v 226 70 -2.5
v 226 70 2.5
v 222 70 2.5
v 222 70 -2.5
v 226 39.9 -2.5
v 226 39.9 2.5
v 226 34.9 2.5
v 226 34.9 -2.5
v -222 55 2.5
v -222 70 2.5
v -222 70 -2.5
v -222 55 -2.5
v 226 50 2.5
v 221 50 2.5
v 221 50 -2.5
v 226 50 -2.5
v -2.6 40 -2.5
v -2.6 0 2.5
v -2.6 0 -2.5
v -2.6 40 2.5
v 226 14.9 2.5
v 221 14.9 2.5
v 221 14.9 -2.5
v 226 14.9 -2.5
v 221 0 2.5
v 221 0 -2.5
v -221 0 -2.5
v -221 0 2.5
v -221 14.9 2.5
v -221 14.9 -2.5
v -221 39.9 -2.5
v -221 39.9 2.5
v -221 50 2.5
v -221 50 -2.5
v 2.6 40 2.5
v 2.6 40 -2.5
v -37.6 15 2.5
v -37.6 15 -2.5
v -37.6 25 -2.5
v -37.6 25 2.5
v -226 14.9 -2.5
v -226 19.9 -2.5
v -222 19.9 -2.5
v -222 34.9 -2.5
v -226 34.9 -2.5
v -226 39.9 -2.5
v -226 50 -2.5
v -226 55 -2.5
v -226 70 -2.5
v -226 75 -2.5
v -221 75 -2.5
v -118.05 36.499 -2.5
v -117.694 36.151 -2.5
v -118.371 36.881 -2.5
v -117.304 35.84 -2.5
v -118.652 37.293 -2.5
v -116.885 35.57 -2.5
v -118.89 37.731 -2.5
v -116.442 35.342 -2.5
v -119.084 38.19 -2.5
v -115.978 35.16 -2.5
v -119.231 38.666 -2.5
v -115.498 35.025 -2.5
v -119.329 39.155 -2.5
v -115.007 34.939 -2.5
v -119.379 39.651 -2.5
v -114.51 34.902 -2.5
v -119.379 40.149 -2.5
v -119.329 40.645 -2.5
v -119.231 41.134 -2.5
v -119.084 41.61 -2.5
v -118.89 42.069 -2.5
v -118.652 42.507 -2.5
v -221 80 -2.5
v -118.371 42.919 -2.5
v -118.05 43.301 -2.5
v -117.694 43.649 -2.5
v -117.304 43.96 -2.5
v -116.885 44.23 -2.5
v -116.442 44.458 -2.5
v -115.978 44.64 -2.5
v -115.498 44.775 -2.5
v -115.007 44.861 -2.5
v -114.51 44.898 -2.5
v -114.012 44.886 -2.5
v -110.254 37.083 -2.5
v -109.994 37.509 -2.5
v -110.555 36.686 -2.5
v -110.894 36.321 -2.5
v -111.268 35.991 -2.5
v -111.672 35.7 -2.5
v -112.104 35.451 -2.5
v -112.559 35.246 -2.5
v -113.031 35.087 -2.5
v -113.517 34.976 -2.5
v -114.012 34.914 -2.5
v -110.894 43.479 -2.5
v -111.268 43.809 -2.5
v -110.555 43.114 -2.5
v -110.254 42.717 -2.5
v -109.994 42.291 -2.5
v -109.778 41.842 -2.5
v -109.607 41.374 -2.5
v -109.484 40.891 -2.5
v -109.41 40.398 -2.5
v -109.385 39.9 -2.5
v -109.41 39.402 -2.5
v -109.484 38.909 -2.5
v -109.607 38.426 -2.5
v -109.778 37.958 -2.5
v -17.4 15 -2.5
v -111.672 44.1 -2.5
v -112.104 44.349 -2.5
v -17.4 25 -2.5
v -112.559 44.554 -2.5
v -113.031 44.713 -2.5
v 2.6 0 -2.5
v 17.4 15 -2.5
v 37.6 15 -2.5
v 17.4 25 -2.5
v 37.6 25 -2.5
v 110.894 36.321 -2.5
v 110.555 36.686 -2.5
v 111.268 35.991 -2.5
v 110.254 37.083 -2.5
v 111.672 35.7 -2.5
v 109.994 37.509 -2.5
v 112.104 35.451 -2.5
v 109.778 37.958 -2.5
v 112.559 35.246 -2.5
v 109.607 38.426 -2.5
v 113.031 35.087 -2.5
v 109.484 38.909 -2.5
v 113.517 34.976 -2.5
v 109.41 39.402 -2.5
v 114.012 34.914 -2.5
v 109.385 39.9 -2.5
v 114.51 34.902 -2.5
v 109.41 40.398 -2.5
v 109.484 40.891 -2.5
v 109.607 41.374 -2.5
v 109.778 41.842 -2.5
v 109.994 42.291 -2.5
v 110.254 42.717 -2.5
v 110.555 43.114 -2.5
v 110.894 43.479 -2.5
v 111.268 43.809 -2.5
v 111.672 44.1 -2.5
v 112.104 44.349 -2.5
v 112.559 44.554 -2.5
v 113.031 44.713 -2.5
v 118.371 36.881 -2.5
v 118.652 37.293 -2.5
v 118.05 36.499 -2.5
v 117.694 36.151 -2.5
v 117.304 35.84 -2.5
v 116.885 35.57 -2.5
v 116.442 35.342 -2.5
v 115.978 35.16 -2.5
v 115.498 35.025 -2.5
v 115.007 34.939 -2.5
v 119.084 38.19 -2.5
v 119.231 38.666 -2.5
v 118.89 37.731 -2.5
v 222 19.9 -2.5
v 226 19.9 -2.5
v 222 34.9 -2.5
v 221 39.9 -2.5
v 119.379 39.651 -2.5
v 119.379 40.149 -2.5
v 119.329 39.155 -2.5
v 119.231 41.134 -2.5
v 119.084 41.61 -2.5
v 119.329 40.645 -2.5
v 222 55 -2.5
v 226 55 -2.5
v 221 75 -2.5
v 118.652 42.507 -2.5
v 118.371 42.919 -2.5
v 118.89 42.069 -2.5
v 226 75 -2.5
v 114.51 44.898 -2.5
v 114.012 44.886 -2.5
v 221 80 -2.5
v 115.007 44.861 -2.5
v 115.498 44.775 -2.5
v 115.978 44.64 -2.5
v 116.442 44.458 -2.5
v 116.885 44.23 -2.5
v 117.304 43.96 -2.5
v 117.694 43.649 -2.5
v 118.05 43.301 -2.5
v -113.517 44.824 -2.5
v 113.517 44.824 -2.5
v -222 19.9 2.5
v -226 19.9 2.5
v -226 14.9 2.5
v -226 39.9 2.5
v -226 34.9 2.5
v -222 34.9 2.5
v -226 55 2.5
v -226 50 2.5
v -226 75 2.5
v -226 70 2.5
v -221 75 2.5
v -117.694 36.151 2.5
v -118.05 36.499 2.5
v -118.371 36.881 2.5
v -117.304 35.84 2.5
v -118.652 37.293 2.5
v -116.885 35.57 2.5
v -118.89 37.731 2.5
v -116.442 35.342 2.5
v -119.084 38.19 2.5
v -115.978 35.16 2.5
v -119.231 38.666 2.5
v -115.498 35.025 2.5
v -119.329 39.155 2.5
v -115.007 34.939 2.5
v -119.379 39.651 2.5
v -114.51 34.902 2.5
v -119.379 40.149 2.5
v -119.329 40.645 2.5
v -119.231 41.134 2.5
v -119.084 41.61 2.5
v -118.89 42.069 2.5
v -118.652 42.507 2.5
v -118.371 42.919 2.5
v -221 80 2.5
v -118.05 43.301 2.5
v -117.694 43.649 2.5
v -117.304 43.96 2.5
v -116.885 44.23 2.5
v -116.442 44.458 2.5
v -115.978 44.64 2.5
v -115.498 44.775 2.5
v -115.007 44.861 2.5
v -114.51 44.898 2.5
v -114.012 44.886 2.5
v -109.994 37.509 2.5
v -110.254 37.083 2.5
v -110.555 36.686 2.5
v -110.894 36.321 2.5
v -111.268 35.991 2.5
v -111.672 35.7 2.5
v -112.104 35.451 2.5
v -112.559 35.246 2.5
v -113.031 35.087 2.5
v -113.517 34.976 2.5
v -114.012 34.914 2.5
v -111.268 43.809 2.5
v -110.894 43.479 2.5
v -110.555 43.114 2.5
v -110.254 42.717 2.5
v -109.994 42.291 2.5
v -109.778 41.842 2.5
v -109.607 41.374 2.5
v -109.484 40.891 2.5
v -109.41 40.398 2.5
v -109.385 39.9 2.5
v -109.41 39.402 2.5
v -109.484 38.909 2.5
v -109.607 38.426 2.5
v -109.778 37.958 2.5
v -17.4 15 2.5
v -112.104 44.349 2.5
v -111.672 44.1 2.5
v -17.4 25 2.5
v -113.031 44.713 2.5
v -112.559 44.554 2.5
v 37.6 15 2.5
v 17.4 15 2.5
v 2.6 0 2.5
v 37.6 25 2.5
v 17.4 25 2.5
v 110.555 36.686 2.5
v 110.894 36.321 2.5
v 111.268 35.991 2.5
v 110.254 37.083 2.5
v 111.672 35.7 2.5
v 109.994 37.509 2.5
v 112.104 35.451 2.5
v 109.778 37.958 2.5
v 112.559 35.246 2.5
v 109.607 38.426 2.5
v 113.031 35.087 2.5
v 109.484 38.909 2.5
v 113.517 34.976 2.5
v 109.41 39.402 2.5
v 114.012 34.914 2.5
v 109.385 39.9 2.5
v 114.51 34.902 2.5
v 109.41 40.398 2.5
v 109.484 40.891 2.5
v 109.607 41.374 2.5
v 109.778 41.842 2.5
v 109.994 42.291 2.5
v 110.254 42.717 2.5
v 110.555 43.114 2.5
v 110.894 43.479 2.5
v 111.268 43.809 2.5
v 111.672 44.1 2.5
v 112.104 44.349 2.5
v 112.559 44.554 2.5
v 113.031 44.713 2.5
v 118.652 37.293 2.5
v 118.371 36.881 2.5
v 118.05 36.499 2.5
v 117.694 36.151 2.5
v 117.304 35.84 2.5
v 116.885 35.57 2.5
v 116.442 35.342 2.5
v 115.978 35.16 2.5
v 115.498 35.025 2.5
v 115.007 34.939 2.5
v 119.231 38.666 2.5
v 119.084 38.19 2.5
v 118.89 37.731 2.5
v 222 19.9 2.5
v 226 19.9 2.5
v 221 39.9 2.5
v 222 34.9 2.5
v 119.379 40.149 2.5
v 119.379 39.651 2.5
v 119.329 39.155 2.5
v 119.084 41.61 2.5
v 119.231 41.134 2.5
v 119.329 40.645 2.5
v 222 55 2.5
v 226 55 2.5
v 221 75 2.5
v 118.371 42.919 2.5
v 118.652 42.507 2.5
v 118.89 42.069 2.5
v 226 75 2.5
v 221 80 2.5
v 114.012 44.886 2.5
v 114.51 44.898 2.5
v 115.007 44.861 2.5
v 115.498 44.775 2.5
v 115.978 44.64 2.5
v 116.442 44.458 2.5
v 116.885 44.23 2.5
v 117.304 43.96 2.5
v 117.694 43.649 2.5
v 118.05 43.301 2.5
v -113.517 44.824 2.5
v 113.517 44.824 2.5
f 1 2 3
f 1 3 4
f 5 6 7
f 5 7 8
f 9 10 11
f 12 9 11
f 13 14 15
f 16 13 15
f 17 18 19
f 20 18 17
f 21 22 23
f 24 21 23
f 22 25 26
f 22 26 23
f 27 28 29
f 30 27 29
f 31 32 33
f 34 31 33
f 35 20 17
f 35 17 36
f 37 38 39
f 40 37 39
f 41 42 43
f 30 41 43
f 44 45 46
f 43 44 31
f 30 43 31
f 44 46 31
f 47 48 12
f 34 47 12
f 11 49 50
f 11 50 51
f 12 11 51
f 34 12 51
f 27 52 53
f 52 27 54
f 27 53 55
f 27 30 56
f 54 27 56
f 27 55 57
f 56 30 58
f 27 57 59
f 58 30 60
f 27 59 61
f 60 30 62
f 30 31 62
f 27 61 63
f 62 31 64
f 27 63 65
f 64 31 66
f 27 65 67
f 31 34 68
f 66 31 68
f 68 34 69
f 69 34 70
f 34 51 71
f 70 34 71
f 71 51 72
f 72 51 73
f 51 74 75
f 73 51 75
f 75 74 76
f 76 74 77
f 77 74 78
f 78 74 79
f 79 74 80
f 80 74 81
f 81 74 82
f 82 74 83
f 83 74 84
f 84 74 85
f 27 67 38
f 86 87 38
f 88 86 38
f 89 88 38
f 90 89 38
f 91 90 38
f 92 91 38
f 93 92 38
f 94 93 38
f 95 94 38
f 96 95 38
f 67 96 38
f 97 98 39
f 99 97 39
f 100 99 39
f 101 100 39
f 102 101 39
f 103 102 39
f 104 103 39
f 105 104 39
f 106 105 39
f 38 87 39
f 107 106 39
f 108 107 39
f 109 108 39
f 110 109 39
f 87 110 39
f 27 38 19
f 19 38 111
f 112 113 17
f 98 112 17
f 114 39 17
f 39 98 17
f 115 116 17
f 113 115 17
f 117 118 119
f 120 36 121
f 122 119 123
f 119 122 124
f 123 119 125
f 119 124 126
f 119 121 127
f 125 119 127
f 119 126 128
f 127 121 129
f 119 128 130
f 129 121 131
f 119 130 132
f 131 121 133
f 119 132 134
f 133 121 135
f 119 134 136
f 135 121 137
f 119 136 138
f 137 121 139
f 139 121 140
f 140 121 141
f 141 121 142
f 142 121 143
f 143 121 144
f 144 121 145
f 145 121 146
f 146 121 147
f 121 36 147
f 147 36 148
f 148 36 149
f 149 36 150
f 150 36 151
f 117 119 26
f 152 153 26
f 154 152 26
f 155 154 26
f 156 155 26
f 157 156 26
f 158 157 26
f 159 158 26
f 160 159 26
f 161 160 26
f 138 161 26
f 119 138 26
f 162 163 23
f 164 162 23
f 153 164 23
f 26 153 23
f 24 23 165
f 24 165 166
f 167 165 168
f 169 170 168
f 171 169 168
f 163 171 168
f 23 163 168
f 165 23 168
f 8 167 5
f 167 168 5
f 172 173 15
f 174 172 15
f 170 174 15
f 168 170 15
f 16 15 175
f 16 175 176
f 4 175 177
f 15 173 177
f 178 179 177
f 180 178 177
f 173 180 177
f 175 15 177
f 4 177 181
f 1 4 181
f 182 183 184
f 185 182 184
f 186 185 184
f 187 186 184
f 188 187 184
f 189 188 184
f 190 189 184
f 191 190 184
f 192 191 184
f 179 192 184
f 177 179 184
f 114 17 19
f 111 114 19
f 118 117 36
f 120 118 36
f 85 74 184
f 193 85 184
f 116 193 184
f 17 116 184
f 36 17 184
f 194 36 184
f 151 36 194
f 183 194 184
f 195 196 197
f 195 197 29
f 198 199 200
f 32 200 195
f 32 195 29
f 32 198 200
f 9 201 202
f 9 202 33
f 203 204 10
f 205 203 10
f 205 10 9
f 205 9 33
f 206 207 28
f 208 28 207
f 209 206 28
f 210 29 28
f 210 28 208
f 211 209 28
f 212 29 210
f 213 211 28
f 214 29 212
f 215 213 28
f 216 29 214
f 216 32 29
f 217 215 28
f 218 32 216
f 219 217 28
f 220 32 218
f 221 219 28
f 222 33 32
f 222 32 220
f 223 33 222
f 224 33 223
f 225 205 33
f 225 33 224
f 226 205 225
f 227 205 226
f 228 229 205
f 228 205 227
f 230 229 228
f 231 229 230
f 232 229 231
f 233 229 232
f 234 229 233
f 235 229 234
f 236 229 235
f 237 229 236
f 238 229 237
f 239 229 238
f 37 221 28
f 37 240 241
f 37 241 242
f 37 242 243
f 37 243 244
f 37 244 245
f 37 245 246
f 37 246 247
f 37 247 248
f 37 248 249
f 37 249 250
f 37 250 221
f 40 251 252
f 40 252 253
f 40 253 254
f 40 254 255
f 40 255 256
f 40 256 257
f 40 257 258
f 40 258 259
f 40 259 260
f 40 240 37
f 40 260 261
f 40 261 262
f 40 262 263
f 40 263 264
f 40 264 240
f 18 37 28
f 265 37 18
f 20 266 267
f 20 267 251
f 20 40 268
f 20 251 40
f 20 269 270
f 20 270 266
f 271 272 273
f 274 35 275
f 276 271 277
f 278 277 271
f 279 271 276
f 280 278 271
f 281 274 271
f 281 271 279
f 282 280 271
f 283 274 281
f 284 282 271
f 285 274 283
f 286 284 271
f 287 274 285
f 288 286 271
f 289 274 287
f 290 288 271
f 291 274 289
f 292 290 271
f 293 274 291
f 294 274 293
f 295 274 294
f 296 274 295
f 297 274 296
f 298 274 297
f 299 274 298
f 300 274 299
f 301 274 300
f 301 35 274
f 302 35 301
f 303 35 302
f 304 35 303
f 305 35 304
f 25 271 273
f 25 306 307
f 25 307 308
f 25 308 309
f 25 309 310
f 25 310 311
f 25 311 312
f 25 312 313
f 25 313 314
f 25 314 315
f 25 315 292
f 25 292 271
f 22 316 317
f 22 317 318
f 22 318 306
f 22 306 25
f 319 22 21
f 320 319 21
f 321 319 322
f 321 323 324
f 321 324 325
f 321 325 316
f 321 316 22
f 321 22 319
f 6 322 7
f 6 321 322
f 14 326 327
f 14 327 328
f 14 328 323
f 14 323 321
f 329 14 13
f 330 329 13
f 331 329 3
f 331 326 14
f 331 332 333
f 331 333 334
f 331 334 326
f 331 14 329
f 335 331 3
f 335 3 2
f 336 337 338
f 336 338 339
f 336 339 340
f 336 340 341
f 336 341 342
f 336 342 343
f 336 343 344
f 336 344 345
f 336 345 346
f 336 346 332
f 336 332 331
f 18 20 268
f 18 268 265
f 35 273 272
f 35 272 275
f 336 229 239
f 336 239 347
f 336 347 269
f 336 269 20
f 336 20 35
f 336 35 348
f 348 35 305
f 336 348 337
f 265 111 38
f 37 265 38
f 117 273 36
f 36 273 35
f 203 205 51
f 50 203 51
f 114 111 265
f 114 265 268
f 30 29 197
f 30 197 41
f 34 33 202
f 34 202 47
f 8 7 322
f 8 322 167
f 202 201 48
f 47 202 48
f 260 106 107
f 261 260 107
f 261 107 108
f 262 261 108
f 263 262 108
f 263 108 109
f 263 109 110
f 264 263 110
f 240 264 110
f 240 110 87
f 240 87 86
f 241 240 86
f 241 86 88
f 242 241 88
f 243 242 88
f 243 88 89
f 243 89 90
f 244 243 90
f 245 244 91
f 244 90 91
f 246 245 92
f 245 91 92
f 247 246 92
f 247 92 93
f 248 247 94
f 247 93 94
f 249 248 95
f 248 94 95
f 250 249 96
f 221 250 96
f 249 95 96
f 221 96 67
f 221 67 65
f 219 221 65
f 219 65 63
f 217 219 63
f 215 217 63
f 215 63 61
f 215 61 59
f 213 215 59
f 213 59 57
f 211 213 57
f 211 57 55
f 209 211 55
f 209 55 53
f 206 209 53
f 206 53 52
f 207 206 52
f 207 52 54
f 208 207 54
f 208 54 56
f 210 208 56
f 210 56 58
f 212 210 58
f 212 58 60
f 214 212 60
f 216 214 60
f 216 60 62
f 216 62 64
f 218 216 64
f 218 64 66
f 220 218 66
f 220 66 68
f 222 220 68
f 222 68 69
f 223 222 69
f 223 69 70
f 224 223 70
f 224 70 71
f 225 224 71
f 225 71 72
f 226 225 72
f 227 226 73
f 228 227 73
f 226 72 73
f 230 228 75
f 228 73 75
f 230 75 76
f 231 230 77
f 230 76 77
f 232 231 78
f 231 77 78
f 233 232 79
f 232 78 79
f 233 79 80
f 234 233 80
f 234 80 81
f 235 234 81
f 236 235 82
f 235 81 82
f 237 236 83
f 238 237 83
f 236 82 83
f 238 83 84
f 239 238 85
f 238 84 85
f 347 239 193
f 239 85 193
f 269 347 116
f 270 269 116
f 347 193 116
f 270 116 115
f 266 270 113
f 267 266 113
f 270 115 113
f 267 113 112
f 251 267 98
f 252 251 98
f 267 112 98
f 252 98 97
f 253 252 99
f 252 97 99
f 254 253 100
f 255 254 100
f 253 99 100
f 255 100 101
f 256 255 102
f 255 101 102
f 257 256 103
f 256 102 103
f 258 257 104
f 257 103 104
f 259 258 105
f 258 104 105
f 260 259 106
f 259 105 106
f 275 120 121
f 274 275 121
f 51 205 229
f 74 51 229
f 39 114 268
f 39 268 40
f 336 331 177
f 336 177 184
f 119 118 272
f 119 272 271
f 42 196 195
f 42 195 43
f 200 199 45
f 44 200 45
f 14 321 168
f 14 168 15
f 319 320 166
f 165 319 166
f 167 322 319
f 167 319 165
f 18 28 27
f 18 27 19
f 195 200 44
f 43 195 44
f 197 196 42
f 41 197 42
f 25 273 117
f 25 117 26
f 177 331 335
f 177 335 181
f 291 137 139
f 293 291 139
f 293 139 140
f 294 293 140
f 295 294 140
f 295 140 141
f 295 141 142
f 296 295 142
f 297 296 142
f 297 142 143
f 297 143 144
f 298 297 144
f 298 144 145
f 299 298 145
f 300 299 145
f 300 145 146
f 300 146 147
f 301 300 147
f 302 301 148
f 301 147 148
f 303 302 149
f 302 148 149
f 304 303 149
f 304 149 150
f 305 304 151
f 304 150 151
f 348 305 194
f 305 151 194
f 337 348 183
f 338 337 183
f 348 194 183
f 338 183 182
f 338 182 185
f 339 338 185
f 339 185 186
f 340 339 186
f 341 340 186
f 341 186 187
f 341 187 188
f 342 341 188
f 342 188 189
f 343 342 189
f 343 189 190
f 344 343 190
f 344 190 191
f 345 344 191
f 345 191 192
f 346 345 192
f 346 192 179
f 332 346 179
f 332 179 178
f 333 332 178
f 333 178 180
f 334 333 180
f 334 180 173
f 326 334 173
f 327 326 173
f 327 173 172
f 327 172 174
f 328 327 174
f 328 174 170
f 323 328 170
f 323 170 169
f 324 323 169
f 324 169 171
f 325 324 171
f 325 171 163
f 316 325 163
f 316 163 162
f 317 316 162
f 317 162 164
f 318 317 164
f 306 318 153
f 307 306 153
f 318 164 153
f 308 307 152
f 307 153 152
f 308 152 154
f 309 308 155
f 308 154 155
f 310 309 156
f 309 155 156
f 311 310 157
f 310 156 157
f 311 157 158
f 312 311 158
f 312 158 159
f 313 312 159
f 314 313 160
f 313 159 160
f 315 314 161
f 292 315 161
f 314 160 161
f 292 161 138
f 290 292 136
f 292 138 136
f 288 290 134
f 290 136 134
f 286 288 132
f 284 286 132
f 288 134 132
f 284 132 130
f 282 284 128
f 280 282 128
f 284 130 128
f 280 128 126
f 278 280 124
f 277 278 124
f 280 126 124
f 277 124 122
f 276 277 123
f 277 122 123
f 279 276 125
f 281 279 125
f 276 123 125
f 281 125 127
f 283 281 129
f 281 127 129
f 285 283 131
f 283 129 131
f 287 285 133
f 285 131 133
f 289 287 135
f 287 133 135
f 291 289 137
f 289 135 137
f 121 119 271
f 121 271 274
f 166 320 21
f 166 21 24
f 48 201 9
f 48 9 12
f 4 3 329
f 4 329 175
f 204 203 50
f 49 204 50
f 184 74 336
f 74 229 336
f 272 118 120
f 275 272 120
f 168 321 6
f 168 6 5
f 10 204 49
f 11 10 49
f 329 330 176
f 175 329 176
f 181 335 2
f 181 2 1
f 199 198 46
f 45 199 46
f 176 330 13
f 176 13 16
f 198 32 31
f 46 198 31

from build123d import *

# Parameters (mm, degrees)
SKETCH1_W           = 442
SKETCH1_H           = 80
BOSS_EXTRUDE1_DEPTH = 2.5
SKETCH7_W           = 5
SKETCH7_H           = 25
BOSS_EXTRUDE2_DEPTH = 5
SKETCH8_W           = 5
SKETCH8_H           = 15
CUT_EXTRUDE6_DEPTH  = 4
SKETCH4_W           = 5.2
SKETCH4_H           = 40
CUT_EXTRUDE7_DEPTH  = 10
SKETCH10_W          = 20.2
SKETCH10_H          = 10
CUT_EXTRUDE8_DEPTH  = 300
SKETCH11_R          = 5
CUT_EXTRUDE9_DEPTH  = 10


with BuildPart() as part:
    # Sketch1 → Boss-Extrude1 (new, symmetric)
    with BuildSketch(Plane.XY):
        with Locations((0, 40)):
            Rectangle(SKETCH1_W, SKETCH1_H)
    extrude(amount=BOSS_EXTRUDE1_DEPTH, both=True)

    # Sketch7 → Boss-Extrude2 (add)
    with BuildSketch(Plane(origin=(221, 0, 0), x_dir=(0, 0, -1), z_dir=(1, 0, 0))):
        with Locations((0, 62.5)):
            Rectangle(SKETCH7_W, SKETCH7_H)
        with Locations((0, 27.4)):
            Rectangle(SKETCH7_W, SKETCH7_H)
    boss_extrude2 = extrude(amount=BOSS_EXTRUDE2_DEPTH)

    # Sketch8 → Cut-Extrude6 (cut)
    with BuildSketch(Plane(origin=(226, 0, 0), x_dir=(0, 0, -1), z_dir=(1, 0, 0))):
        with Locations((0, 62.5)):
            Rectangle(SKETCH8_W, SKETCH8_H)
        with Locations((0, 27.4)):
            Rectangle(SKETCH8_W, SKETCH8_H)
    cut_extrude6 = extrude(amount=-CUT_EXTRUDE6_DEPTH, mode=Mode.SUBTRACT)

    # Mirror8: Boss-Extrude2, Cut-Extrude6 across plane
    add(boss_extrude2.mirror(Plane(origin=(0, 0, 0), x_dir=(0, 0, 1), z_dir=(1, 0, 0))))
    add(cut_extrude6.mirror(Plane(origin=(0, 0, 0), x_dir=(0, 0, 1), z_dir=(1, 0, 0))), mode=Mode.SUBTRACT)

    # Sketch4 → Cut-Extrude7 (cut)
    with BuildSketch(Plane.XY.offset(2.5)):
        with Locations((0, 20)):
            Rectangle(SKETCH4_W, SKETCH4_H)
    extrude(amount=-CUT_EXTRUDE7_DEPTH, mode=Mode.SUBTRACT)

    # Sketch10 → Cut-Extrude8 (cut)
    with BuildSketch(Plane(origin=(0, -565.456150304, -2.5), x_dir=(-1, 0, 0), z_dir=(0, 0, -1))):
        with Locations((27.5, 585.456150304)):
            Rectangle(SKETCH10_W, SKETCH10_H)
    cut_extrude8 = extrude(amount=-CUT_EXTRUDE8_DEPTH, mode=Mode.SUBTRACT)

    # Mirror9: Cut-Extrude8 across plane
    add(cut_extrude8.mirror(Plane(origin=(0, 0, 0), x_dir=(0, 0, 1), z_dir=(1, 0, 0))), mode=Mode.SUBTRACT)

    # Sketch11 → Cut-Extrude9 (cut)
    with BuildSketch(Plane(origin=(0, 0, -2.5), x_dir=(-1, 0, 0), z_dir=(0, 0, -1))):
        with Locations((-114.385224348, 39.9)):
            Circle(SKETCH11_R)
        with Locations(Location((114.385224348, 39.9, 0), (0, 0, 180))):
            Circle(SKETCH11_R)
    extrude(amount=-CUT_EXTRUDE9_DEPTH, mode=Mode.SUBTRACT)


solid = part.part
